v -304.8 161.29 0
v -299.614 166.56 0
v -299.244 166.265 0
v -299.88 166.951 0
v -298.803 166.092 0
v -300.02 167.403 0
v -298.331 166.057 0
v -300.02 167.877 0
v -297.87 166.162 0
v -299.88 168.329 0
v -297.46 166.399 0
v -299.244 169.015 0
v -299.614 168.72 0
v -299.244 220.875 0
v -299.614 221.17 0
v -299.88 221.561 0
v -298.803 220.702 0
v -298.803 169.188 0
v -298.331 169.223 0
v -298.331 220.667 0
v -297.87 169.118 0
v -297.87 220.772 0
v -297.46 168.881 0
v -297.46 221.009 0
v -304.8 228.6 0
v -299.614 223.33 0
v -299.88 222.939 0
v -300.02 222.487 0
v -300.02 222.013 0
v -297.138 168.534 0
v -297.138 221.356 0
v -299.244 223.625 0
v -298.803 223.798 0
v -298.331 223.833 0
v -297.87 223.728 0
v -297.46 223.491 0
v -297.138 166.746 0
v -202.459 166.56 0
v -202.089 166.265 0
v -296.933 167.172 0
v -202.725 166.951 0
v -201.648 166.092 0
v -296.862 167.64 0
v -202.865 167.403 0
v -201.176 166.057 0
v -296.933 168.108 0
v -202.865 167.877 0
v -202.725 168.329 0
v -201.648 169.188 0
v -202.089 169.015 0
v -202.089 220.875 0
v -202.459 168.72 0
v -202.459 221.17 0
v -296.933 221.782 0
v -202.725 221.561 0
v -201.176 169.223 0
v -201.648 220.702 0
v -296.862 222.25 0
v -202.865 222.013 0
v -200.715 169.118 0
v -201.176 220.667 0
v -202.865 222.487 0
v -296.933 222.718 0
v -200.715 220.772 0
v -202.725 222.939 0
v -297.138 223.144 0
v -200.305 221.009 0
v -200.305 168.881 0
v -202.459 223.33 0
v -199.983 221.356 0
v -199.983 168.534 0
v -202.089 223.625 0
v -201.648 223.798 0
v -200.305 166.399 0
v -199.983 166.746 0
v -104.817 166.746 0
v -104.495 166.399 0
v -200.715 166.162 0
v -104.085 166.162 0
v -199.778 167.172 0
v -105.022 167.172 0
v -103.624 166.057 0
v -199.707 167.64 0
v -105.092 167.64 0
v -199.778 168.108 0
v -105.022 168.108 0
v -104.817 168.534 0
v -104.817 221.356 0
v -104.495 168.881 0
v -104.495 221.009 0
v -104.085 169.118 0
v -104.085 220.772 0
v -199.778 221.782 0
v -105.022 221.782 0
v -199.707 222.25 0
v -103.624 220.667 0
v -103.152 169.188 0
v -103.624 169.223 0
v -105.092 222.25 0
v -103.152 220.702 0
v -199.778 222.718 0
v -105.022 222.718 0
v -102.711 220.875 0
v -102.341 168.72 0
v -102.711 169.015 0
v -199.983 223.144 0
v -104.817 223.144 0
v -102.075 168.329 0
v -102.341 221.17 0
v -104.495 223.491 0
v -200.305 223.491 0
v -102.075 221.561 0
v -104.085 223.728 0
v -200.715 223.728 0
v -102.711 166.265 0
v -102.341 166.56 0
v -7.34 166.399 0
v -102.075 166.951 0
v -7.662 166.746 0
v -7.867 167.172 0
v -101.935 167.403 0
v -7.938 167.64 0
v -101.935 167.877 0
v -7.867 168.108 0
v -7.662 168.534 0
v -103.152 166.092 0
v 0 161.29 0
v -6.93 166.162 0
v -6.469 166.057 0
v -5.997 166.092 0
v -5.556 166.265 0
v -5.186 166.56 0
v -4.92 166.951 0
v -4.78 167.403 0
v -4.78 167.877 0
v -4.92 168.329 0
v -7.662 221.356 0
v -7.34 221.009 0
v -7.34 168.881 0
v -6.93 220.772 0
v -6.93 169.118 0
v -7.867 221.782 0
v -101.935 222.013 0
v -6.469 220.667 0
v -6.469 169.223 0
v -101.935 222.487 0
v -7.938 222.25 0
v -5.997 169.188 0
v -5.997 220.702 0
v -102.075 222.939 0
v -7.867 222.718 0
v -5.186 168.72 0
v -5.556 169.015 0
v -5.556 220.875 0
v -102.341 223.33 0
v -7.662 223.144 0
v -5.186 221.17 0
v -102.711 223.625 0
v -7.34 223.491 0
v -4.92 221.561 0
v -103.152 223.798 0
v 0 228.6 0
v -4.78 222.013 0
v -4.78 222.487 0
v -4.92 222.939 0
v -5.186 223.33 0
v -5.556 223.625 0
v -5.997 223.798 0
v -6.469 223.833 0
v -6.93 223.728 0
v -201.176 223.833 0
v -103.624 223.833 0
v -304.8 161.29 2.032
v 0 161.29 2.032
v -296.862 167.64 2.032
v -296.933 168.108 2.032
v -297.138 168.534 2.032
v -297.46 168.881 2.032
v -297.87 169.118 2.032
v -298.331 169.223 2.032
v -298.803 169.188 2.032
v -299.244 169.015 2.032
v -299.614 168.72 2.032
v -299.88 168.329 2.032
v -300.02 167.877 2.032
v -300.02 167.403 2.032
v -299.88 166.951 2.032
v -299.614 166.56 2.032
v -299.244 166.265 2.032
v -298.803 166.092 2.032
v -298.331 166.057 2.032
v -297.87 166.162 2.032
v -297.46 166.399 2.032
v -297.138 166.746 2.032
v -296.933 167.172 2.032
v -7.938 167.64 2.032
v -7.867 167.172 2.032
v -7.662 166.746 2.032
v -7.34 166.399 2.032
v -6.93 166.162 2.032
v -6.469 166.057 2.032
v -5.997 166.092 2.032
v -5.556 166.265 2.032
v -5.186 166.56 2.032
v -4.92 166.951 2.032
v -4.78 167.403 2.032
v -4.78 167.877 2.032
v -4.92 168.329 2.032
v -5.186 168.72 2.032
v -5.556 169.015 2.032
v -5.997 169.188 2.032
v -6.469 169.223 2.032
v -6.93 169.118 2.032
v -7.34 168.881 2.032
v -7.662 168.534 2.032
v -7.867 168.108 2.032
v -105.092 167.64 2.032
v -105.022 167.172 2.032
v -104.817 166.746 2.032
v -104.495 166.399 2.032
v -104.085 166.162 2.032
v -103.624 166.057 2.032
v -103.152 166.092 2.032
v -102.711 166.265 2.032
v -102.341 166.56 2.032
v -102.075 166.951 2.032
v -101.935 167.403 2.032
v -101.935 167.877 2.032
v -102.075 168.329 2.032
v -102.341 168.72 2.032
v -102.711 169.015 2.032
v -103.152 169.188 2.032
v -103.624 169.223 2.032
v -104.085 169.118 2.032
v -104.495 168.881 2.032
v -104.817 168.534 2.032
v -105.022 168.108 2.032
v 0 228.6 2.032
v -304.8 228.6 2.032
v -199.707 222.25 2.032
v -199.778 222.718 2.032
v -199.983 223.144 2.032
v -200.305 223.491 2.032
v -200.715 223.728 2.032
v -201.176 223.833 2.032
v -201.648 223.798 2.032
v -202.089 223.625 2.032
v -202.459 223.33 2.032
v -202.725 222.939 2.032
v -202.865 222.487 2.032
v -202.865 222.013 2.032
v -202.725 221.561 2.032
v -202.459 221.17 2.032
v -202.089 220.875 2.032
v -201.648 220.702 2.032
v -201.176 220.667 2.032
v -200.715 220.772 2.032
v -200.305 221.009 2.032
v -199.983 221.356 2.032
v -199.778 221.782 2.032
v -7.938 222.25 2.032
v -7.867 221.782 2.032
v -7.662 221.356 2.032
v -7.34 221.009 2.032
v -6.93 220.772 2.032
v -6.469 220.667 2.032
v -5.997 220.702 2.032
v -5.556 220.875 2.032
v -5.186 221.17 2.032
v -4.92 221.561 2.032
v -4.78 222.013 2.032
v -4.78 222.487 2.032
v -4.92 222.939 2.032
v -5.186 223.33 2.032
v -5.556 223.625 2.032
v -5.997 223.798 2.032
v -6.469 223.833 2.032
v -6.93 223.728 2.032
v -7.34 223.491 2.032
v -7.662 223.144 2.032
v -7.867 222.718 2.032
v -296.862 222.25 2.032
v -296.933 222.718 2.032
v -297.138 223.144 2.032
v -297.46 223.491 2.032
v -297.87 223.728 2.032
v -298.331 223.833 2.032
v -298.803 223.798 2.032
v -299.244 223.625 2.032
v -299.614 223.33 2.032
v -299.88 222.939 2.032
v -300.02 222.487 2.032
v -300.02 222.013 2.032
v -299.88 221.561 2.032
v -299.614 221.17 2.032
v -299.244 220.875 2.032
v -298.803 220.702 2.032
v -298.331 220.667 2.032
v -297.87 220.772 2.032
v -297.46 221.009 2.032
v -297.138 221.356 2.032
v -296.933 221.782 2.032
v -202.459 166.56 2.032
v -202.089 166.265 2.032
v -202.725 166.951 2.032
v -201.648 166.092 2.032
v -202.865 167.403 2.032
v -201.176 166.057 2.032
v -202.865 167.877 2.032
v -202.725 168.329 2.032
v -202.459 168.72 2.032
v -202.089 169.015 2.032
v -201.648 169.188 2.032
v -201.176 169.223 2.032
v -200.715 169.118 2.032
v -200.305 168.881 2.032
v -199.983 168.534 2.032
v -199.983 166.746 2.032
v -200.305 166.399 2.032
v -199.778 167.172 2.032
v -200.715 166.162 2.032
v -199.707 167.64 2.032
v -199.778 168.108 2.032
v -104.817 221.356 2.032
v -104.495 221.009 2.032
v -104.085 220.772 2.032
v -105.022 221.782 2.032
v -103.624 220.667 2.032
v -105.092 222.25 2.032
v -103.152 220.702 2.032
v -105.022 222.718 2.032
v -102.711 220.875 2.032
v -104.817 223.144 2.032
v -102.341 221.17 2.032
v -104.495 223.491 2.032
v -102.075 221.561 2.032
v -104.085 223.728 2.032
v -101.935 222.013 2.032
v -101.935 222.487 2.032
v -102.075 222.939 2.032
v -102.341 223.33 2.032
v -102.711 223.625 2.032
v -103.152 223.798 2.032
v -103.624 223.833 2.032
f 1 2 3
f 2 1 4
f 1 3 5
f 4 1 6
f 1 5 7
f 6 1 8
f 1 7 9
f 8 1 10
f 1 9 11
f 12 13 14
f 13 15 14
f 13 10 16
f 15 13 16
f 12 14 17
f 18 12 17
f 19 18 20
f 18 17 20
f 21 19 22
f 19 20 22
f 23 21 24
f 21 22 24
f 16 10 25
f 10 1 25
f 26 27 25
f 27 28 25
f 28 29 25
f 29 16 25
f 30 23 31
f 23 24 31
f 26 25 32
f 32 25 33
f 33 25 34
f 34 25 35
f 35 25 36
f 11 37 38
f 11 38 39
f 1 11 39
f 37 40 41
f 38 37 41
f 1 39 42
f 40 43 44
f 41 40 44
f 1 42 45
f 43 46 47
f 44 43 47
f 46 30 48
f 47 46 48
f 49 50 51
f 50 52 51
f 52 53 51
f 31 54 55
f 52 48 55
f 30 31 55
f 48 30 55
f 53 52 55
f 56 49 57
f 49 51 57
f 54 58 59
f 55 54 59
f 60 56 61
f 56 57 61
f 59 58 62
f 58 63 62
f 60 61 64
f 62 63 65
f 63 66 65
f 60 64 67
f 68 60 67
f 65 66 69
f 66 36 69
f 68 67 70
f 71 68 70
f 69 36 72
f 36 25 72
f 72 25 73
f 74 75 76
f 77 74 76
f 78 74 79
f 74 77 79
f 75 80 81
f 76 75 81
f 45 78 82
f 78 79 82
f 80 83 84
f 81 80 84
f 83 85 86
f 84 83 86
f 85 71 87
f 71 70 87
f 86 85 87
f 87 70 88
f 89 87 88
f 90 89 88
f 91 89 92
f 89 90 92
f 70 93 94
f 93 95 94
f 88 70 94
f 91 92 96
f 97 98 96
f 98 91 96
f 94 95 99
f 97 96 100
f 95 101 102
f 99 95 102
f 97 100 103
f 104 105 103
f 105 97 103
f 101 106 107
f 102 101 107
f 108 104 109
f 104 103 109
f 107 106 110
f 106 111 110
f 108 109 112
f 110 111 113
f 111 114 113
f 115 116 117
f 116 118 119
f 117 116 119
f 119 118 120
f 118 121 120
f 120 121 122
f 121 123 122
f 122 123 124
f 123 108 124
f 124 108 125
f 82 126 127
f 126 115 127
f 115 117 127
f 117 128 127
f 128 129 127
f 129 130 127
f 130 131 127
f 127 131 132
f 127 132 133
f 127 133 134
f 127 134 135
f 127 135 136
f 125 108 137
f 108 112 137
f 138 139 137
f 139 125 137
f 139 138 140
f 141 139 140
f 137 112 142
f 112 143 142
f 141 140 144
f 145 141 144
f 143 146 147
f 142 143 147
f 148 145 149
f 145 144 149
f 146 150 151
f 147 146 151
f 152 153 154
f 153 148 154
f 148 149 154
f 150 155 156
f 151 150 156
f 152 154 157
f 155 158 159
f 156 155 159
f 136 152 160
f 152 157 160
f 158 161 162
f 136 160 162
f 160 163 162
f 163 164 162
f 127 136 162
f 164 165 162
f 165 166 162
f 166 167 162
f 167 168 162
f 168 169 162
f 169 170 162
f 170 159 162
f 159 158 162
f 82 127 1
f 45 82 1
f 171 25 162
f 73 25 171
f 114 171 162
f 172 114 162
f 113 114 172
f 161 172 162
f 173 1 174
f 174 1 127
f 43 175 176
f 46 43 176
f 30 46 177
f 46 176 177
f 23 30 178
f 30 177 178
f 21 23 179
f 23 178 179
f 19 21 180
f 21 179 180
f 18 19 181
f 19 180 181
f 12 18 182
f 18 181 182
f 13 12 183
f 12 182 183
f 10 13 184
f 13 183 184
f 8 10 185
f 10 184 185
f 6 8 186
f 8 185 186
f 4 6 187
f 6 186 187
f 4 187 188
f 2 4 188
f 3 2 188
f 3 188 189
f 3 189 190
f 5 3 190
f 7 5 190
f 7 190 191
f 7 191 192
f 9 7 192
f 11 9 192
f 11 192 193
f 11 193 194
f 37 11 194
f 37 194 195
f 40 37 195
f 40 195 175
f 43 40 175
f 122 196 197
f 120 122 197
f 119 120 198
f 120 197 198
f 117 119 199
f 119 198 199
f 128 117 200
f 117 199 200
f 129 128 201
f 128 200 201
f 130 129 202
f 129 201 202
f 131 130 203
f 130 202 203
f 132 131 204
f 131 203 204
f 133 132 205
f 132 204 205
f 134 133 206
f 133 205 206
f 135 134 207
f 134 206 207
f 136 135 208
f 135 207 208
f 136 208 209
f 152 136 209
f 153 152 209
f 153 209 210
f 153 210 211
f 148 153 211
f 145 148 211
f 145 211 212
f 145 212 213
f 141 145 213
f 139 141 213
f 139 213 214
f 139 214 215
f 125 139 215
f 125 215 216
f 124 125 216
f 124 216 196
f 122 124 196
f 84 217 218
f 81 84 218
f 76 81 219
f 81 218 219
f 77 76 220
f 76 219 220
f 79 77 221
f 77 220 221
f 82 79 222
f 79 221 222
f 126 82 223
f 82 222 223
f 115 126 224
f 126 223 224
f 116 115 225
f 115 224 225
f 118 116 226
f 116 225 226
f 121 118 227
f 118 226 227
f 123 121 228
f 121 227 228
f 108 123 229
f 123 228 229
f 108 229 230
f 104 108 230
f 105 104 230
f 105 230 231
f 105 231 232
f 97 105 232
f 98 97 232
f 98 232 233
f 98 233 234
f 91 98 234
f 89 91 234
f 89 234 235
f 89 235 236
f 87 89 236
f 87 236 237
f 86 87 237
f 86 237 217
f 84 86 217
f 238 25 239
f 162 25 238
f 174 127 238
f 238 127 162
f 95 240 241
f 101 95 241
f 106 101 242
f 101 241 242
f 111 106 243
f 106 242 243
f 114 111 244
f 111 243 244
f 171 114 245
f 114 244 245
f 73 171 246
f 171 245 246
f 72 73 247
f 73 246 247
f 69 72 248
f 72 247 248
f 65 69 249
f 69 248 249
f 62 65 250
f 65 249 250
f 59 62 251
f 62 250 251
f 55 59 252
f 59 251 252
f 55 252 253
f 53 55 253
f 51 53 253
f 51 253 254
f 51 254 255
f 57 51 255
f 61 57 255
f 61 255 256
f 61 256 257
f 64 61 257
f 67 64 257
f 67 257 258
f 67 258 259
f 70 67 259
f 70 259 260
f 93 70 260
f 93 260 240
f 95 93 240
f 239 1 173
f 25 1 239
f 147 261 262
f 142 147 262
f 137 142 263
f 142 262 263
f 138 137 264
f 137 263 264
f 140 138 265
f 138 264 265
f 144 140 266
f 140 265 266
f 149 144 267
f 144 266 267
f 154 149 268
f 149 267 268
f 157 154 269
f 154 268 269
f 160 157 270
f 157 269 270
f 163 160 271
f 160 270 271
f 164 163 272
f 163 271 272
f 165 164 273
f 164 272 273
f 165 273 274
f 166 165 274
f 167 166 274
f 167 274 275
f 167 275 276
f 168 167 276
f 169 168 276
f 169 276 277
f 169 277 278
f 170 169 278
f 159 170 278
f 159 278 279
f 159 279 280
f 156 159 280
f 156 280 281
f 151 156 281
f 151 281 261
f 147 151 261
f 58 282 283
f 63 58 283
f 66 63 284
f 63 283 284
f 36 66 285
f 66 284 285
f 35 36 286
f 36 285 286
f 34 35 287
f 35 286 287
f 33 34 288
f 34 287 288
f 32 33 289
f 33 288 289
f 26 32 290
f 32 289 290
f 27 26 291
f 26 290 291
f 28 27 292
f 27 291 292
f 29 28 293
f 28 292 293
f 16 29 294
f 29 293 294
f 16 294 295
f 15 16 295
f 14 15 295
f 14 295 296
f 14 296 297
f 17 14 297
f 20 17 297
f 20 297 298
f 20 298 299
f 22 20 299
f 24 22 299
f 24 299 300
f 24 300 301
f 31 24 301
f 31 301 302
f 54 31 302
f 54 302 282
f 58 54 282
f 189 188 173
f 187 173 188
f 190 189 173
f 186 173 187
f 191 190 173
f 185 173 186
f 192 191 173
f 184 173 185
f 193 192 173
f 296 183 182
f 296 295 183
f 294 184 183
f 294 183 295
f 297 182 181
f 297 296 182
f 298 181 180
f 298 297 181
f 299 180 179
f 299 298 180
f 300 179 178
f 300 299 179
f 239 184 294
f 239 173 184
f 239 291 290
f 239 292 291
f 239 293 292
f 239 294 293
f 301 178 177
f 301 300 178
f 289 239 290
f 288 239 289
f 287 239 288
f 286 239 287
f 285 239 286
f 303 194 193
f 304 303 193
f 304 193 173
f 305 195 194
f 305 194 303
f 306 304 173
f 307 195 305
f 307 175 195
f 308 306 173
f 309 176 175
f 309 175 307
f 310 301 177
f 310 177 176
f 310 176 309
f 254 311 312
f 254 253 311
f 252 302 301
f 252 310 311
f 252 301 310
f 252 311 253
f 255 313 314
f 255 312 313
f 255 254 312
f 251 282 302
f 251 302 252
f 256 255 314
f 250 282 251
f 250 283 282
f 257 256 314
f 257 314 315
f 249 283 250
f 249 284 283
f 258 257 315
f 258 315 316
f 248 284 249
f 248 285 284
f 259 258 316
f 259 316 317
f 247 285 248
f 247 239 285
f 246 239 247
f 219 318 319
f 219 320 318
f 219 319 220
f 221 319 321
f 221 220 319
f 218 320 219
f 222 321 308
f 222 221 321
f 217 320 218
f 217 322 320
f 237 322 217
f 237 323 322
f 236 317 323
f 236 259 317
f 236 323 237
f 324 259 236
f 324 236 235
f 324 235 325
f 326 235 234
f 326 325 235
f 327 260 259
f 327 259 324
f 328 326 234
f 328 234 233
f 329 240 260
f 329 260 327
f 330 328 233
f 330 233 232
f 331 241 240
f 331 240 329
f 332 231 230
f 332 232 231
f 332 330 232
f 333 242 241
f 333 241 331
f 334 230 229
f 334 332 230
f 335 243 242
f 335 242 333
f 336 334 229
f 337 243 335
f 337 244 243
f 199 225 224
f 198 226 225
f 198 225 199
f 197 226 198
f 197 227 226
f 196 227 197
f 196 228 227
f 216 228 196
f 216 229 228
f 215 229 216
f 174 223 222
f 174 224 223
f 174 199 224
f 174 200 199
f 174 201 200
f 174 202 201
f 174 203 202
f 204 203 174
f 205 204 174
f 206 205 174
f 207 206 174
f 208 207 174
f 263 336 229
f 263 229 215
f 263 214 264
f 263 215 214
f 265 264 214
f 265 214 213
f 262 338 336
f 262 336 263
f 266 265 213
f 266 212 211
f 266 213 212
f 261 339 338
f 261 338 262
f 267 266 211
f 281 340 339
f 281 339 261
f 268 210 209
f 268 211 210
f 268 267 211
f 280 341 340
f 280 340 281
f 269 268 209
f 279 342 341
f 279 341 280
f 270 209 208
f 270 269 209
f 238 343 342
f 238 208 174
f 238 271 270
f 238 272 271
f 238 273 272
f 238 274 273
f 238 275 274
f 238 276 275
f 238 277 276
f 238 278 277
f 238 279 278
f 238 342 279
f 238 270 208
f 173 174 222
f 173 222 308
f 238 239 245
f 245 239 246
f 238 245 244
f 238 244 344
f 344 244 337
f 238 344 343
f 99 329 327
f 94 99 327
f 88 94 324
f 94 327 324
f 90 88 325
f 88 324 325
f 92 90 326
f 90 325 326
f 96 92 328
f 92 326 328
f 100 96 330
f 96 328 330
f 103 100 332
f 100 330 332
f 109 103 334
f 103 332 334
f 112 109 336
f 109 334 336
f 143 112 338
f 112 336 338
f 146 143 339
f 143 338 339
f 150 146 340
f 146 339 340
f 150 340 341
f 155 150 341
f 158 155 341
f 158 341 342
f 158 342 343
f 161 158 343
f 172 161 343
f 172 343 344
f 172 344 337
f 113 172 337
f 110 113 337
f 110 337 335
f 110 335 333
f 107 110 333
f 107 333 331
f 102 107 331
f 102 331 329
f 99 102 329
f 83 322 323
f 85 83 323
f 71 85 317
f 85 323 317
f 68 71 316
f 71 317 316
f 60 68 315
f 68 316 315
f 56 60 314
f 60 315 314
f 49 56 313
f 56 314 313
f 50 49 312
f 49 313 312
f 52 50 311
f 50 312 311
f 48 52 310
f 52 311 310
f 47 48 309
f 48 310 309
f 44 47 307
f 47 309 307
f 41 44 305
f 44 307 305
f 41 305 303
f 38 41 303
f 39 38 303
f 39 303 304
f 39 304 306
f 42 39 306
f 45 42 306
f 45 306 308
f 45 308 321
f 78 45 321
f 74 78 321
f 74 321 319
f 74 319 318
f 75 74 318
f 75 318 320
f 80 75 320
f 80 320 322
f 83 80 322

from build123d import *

# Parameters (mm, degrees)
SKETCH1_W          = 304.8
SKETCH1_H          = 67.31
EXTRUDE1_DEPTH     = 2.032
SKETCH2_R          = 1.5875
CUT_EXTRUDE1_DEPTH = 382.005418628


with BuildPart() as part:
    # Sketch1 → Extrude1 (new body)
    with BuildSketch(Plane.XY):
        with Locations((-152.4, 194.945)):
            Rectangle(SKETCH1_W, SKETCH1_H)
    extrude(amount=EXTRUDE1_DEPTH)

    # Sketch2 → Cut-Extrude1 (cut, through all)
    with BuildSketch(Plane.XY.offset(2.032)):
        with Locations((-201.295, 222.25)):
            Circle(SKETCH2_R)
        with Locations((-298.45, 222.25)):
            Circle(SKETCH2_R)
        with Locations((-298.45, 167.64)):
            Circle(SKETCH2_R)
        with Locations((-201.295, 167.64)):
            Circle(SKETCH2_R)
        with Locations(Location((-103.505, 167.64, 0), (0, 0, 180))):
            Circle(SKETCH2_R)
        with Locations(Location((-6.35, 167.64, 0), (0, 0, 180))):
            Circle(SKETCH2_R)
        with Locations(Location((-6.35, 222.25, 0), (0, 0, 180))):
            Circle(SKETCH2_R)
        with Locations(Location((-103.505, 222.25, 0), (0, 0, 180))):
            Circle(SKETCH2_R)
    extrude(amount=-CUT_EXTRUDE1_DEPTH, mode=Mode.SUBTRACT)


solid = part.part
